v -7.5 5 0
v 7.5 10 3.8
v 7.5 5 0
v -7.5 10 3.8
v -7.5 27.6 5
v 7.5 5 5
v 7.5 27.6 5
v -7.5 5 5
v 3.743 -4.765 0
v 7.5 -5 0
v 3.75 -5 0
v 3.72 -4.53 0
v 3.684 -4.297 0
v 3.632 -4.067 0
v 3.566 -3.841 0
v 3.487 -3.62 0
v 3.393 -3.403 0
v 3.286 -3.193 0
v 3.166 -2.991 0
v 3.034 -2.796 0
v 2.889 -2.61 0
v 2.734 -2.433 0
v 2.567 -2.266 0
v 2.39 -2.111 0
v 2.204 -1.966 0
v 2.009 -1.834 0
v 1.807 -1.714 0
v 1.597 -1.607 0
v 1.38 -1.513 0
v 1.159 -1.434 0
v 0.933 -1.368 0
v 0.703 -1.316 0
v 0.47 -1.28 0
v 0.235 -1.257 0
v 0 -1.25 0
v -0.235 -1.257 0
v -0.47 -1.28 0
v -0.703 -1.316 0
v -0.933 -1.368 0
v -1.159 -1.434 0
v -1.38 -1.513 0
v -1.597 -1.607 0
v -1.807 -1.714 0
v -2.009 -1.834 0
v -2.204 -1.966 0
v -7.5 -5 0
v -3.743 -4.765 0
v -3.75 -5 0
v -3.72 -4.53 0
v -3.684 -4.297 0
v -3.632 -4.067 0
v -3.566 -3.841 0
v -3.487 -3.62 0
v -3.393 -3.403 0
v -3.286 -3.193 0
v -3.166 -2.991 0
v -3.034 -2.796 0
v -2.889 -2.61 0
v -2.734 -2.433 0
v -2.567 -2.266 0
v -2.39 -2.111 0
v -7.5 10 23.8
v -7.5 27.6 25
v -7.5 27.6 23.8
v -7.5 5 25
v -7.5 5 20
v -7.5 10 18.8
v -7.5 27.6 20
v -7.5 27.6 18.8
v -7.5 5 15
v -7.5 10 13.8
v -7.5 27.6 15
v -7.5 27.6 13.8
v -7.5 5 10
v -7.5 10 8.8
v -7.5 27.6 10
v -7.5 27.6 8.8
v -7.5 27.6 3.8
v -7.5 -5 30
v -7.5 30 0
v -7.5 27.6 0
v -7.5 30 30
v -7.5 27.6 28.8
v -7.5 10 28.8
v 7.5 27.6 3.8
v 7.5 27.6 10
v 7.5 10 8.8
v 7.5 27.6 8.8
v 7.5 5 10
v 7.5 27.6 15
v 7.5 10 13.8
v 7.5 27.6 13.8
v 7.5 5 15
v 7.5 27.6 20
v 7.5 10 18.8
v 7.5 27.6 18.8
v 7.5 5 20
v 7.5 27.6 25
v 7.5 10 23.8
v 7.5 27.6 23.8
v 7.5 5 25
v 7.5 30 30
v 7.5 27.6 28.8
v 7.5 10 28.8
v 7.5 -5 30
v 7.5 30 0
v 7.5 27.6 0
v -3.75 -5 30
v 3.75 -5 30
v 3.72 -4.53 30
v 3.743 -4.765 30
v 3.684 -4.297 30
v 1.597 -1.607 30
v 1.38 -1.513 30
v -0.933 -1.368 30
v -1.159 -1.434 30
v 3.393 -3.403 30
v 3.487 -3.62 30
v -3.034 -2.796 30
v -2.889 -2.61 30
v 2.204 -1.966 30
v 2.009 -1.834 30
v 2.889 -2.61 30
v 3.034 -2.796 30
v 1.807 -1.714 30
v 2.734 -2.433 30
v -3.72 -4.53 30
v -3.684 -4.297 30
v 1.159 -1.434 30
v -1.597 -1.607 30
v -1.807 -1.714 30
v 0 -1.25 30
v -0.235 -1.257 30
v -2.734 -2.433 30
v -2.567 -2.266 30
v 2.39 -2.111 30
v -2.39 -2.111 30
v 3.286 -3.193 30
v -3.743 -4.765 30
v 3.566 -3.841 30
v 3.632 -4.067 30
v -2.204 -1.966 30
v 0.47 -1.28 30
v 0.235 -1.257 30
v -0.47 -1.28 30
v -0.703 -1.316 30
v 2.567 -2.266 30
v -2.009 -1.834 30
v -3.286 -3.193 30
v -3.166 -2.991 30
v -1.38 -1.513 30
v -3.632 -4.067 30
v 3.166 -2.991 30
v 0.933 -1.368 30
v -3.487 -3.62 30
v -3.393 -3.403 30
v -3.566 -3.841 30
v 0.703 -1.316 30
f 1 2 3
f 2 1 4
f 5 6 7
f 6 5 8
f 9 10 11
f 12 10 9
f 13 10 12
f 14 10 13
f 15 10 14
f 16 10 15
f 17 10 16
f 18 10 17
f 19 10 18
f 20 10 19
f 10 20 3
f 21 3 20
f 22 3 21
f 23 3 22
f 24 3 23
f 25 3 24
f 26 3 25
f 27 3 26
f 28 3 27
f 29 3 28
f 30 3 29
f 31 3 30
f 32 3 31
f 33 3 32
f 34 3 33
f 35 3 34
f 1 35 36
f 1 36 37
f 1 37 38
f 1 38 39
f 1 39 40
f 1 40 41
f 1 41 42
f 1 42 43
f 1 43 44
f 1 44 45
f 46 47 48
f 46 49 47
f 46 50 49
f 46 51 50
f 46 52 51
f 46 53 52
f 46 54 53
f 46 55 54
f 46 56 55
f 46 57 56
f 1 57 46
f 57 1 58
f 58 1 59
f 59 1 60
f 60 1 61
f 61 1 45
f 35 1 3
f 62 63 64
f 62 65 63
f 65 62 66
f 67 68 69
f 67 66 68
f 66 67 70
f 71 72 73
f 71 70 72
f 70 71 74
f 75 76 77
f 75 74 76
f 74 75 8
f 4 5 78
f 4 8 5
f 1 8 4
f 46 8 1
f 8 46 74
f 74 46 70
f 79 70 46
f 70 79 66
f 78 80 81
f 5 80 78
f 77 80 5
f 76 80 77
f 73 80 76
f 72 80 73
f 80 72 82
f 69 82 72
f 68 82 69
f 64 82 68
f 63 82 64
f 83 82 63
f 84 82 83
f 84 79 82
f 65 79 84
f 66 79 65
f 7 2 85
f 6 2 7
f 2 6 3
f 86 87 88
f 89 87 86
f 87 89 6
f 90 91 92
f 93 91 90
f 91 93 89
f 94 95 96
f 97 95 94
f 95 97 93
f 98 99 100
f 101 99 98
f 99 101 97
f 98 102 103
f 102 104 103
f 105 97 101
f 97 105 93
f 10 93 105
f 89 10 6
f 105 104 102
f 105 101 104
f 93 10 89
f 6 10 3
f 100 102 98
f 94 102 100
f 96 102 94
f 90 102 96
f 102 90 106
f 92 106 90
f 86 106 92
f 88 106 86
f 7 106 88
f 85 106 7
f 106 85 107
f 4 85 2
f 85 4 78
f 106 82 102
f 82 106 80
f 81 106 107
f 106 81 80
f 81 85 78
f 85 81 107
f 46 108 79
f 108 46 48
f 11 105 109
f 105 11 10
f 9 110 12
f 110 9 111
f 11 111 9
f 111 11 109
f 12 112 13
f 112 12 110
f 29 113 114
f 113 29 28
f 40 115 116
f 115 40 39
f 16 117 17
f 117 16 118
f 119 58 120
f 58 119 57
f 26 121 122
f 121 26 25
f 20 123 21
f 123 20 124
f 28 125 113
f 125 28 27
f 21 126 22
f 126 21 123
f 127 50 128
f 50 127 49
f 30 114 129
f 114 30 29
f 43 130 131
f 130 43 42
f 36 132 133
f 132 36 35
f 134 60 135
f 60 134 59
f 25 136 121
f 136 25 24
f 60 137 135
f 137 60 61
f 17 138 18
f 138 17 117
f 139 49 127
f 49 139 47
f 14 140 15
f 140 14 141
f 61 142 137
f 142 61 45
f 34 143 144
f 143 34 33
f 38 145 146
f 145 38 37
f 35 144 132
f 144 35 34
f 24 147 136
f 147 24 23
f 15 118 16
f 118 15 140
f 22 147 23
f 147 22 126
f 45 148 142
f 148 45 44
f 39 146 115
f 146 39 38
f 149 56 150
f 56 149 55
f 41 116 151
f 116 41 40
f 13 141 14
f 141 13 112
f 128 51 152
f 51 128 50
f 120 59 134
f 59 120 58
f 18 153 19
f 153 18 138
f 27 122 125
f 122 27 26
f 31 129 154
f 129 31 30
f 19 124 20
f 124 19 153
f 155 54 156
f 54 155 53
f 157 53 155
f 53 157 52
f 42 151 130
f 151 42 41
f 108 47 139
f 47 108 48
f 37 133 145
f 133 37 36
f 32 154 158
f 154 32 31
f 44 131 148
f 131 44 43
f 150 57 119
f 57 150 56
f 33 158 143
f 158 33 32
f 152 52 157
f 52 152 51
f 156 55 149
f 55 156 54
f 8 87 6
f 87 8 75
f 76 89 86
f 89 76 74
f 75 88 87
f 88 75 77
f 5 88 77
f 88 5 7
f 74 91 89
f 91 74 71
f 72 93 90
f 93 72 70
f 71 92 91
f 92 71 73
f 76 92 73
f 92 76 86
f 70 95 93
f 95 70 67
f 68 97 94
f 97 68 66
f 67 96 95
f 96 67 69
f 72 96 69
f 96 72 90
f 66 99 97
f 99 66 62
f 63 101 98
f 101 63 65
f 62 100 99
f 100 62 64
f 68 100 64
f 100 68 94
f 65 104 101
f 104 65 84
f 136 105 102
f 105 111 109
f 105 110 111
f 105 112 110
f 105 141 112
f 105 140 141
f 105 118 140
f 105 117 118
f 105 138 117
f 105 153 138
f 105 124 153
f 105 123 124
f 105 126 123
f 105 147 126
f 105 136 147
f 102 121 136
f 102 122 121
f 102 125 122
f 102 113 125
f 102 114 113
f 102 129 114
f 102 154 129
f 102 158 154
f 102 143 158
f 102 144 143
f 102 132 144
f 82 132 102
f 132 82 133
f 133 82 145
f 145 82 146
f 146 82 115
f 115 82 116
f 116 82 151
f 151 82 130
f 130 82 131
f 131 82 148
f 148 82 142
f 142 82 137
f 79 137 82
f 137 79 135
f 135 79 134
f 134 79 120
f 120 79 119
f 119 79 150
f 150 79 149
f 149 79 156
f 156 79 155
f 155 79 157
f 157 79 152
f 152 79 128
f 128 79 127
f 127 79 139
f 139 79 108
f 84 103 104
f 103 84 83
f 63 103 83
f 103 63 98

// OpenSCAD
$fn=100;

ht=5;
l=30;
w=15;
d1=8;
d2=6;
q=5;
t=1.2;

for(i=[0:ht:ht*q]){
    difference(){
        union(){
            hull(){
                translate([-w/2,0,i])
                cube([w,ht,ht]);
                
                translate([-w/2,0,i+ht-t])
                cube([w,ht*2,1]);
            }

            translate([-w/2,0,i+ht-t])
            cube([w,l,1.2]);

            translate([-w/2,l-t*2,i])
            cube([w,t*2,ht]);
            
            //
            translate([-w/2,-ht,i])
            cube([w,ht,ht]);
        }

        translate([0,-ht,i-.1])
        cylinder(d=w/2, h=ht+1);
    }    
}
